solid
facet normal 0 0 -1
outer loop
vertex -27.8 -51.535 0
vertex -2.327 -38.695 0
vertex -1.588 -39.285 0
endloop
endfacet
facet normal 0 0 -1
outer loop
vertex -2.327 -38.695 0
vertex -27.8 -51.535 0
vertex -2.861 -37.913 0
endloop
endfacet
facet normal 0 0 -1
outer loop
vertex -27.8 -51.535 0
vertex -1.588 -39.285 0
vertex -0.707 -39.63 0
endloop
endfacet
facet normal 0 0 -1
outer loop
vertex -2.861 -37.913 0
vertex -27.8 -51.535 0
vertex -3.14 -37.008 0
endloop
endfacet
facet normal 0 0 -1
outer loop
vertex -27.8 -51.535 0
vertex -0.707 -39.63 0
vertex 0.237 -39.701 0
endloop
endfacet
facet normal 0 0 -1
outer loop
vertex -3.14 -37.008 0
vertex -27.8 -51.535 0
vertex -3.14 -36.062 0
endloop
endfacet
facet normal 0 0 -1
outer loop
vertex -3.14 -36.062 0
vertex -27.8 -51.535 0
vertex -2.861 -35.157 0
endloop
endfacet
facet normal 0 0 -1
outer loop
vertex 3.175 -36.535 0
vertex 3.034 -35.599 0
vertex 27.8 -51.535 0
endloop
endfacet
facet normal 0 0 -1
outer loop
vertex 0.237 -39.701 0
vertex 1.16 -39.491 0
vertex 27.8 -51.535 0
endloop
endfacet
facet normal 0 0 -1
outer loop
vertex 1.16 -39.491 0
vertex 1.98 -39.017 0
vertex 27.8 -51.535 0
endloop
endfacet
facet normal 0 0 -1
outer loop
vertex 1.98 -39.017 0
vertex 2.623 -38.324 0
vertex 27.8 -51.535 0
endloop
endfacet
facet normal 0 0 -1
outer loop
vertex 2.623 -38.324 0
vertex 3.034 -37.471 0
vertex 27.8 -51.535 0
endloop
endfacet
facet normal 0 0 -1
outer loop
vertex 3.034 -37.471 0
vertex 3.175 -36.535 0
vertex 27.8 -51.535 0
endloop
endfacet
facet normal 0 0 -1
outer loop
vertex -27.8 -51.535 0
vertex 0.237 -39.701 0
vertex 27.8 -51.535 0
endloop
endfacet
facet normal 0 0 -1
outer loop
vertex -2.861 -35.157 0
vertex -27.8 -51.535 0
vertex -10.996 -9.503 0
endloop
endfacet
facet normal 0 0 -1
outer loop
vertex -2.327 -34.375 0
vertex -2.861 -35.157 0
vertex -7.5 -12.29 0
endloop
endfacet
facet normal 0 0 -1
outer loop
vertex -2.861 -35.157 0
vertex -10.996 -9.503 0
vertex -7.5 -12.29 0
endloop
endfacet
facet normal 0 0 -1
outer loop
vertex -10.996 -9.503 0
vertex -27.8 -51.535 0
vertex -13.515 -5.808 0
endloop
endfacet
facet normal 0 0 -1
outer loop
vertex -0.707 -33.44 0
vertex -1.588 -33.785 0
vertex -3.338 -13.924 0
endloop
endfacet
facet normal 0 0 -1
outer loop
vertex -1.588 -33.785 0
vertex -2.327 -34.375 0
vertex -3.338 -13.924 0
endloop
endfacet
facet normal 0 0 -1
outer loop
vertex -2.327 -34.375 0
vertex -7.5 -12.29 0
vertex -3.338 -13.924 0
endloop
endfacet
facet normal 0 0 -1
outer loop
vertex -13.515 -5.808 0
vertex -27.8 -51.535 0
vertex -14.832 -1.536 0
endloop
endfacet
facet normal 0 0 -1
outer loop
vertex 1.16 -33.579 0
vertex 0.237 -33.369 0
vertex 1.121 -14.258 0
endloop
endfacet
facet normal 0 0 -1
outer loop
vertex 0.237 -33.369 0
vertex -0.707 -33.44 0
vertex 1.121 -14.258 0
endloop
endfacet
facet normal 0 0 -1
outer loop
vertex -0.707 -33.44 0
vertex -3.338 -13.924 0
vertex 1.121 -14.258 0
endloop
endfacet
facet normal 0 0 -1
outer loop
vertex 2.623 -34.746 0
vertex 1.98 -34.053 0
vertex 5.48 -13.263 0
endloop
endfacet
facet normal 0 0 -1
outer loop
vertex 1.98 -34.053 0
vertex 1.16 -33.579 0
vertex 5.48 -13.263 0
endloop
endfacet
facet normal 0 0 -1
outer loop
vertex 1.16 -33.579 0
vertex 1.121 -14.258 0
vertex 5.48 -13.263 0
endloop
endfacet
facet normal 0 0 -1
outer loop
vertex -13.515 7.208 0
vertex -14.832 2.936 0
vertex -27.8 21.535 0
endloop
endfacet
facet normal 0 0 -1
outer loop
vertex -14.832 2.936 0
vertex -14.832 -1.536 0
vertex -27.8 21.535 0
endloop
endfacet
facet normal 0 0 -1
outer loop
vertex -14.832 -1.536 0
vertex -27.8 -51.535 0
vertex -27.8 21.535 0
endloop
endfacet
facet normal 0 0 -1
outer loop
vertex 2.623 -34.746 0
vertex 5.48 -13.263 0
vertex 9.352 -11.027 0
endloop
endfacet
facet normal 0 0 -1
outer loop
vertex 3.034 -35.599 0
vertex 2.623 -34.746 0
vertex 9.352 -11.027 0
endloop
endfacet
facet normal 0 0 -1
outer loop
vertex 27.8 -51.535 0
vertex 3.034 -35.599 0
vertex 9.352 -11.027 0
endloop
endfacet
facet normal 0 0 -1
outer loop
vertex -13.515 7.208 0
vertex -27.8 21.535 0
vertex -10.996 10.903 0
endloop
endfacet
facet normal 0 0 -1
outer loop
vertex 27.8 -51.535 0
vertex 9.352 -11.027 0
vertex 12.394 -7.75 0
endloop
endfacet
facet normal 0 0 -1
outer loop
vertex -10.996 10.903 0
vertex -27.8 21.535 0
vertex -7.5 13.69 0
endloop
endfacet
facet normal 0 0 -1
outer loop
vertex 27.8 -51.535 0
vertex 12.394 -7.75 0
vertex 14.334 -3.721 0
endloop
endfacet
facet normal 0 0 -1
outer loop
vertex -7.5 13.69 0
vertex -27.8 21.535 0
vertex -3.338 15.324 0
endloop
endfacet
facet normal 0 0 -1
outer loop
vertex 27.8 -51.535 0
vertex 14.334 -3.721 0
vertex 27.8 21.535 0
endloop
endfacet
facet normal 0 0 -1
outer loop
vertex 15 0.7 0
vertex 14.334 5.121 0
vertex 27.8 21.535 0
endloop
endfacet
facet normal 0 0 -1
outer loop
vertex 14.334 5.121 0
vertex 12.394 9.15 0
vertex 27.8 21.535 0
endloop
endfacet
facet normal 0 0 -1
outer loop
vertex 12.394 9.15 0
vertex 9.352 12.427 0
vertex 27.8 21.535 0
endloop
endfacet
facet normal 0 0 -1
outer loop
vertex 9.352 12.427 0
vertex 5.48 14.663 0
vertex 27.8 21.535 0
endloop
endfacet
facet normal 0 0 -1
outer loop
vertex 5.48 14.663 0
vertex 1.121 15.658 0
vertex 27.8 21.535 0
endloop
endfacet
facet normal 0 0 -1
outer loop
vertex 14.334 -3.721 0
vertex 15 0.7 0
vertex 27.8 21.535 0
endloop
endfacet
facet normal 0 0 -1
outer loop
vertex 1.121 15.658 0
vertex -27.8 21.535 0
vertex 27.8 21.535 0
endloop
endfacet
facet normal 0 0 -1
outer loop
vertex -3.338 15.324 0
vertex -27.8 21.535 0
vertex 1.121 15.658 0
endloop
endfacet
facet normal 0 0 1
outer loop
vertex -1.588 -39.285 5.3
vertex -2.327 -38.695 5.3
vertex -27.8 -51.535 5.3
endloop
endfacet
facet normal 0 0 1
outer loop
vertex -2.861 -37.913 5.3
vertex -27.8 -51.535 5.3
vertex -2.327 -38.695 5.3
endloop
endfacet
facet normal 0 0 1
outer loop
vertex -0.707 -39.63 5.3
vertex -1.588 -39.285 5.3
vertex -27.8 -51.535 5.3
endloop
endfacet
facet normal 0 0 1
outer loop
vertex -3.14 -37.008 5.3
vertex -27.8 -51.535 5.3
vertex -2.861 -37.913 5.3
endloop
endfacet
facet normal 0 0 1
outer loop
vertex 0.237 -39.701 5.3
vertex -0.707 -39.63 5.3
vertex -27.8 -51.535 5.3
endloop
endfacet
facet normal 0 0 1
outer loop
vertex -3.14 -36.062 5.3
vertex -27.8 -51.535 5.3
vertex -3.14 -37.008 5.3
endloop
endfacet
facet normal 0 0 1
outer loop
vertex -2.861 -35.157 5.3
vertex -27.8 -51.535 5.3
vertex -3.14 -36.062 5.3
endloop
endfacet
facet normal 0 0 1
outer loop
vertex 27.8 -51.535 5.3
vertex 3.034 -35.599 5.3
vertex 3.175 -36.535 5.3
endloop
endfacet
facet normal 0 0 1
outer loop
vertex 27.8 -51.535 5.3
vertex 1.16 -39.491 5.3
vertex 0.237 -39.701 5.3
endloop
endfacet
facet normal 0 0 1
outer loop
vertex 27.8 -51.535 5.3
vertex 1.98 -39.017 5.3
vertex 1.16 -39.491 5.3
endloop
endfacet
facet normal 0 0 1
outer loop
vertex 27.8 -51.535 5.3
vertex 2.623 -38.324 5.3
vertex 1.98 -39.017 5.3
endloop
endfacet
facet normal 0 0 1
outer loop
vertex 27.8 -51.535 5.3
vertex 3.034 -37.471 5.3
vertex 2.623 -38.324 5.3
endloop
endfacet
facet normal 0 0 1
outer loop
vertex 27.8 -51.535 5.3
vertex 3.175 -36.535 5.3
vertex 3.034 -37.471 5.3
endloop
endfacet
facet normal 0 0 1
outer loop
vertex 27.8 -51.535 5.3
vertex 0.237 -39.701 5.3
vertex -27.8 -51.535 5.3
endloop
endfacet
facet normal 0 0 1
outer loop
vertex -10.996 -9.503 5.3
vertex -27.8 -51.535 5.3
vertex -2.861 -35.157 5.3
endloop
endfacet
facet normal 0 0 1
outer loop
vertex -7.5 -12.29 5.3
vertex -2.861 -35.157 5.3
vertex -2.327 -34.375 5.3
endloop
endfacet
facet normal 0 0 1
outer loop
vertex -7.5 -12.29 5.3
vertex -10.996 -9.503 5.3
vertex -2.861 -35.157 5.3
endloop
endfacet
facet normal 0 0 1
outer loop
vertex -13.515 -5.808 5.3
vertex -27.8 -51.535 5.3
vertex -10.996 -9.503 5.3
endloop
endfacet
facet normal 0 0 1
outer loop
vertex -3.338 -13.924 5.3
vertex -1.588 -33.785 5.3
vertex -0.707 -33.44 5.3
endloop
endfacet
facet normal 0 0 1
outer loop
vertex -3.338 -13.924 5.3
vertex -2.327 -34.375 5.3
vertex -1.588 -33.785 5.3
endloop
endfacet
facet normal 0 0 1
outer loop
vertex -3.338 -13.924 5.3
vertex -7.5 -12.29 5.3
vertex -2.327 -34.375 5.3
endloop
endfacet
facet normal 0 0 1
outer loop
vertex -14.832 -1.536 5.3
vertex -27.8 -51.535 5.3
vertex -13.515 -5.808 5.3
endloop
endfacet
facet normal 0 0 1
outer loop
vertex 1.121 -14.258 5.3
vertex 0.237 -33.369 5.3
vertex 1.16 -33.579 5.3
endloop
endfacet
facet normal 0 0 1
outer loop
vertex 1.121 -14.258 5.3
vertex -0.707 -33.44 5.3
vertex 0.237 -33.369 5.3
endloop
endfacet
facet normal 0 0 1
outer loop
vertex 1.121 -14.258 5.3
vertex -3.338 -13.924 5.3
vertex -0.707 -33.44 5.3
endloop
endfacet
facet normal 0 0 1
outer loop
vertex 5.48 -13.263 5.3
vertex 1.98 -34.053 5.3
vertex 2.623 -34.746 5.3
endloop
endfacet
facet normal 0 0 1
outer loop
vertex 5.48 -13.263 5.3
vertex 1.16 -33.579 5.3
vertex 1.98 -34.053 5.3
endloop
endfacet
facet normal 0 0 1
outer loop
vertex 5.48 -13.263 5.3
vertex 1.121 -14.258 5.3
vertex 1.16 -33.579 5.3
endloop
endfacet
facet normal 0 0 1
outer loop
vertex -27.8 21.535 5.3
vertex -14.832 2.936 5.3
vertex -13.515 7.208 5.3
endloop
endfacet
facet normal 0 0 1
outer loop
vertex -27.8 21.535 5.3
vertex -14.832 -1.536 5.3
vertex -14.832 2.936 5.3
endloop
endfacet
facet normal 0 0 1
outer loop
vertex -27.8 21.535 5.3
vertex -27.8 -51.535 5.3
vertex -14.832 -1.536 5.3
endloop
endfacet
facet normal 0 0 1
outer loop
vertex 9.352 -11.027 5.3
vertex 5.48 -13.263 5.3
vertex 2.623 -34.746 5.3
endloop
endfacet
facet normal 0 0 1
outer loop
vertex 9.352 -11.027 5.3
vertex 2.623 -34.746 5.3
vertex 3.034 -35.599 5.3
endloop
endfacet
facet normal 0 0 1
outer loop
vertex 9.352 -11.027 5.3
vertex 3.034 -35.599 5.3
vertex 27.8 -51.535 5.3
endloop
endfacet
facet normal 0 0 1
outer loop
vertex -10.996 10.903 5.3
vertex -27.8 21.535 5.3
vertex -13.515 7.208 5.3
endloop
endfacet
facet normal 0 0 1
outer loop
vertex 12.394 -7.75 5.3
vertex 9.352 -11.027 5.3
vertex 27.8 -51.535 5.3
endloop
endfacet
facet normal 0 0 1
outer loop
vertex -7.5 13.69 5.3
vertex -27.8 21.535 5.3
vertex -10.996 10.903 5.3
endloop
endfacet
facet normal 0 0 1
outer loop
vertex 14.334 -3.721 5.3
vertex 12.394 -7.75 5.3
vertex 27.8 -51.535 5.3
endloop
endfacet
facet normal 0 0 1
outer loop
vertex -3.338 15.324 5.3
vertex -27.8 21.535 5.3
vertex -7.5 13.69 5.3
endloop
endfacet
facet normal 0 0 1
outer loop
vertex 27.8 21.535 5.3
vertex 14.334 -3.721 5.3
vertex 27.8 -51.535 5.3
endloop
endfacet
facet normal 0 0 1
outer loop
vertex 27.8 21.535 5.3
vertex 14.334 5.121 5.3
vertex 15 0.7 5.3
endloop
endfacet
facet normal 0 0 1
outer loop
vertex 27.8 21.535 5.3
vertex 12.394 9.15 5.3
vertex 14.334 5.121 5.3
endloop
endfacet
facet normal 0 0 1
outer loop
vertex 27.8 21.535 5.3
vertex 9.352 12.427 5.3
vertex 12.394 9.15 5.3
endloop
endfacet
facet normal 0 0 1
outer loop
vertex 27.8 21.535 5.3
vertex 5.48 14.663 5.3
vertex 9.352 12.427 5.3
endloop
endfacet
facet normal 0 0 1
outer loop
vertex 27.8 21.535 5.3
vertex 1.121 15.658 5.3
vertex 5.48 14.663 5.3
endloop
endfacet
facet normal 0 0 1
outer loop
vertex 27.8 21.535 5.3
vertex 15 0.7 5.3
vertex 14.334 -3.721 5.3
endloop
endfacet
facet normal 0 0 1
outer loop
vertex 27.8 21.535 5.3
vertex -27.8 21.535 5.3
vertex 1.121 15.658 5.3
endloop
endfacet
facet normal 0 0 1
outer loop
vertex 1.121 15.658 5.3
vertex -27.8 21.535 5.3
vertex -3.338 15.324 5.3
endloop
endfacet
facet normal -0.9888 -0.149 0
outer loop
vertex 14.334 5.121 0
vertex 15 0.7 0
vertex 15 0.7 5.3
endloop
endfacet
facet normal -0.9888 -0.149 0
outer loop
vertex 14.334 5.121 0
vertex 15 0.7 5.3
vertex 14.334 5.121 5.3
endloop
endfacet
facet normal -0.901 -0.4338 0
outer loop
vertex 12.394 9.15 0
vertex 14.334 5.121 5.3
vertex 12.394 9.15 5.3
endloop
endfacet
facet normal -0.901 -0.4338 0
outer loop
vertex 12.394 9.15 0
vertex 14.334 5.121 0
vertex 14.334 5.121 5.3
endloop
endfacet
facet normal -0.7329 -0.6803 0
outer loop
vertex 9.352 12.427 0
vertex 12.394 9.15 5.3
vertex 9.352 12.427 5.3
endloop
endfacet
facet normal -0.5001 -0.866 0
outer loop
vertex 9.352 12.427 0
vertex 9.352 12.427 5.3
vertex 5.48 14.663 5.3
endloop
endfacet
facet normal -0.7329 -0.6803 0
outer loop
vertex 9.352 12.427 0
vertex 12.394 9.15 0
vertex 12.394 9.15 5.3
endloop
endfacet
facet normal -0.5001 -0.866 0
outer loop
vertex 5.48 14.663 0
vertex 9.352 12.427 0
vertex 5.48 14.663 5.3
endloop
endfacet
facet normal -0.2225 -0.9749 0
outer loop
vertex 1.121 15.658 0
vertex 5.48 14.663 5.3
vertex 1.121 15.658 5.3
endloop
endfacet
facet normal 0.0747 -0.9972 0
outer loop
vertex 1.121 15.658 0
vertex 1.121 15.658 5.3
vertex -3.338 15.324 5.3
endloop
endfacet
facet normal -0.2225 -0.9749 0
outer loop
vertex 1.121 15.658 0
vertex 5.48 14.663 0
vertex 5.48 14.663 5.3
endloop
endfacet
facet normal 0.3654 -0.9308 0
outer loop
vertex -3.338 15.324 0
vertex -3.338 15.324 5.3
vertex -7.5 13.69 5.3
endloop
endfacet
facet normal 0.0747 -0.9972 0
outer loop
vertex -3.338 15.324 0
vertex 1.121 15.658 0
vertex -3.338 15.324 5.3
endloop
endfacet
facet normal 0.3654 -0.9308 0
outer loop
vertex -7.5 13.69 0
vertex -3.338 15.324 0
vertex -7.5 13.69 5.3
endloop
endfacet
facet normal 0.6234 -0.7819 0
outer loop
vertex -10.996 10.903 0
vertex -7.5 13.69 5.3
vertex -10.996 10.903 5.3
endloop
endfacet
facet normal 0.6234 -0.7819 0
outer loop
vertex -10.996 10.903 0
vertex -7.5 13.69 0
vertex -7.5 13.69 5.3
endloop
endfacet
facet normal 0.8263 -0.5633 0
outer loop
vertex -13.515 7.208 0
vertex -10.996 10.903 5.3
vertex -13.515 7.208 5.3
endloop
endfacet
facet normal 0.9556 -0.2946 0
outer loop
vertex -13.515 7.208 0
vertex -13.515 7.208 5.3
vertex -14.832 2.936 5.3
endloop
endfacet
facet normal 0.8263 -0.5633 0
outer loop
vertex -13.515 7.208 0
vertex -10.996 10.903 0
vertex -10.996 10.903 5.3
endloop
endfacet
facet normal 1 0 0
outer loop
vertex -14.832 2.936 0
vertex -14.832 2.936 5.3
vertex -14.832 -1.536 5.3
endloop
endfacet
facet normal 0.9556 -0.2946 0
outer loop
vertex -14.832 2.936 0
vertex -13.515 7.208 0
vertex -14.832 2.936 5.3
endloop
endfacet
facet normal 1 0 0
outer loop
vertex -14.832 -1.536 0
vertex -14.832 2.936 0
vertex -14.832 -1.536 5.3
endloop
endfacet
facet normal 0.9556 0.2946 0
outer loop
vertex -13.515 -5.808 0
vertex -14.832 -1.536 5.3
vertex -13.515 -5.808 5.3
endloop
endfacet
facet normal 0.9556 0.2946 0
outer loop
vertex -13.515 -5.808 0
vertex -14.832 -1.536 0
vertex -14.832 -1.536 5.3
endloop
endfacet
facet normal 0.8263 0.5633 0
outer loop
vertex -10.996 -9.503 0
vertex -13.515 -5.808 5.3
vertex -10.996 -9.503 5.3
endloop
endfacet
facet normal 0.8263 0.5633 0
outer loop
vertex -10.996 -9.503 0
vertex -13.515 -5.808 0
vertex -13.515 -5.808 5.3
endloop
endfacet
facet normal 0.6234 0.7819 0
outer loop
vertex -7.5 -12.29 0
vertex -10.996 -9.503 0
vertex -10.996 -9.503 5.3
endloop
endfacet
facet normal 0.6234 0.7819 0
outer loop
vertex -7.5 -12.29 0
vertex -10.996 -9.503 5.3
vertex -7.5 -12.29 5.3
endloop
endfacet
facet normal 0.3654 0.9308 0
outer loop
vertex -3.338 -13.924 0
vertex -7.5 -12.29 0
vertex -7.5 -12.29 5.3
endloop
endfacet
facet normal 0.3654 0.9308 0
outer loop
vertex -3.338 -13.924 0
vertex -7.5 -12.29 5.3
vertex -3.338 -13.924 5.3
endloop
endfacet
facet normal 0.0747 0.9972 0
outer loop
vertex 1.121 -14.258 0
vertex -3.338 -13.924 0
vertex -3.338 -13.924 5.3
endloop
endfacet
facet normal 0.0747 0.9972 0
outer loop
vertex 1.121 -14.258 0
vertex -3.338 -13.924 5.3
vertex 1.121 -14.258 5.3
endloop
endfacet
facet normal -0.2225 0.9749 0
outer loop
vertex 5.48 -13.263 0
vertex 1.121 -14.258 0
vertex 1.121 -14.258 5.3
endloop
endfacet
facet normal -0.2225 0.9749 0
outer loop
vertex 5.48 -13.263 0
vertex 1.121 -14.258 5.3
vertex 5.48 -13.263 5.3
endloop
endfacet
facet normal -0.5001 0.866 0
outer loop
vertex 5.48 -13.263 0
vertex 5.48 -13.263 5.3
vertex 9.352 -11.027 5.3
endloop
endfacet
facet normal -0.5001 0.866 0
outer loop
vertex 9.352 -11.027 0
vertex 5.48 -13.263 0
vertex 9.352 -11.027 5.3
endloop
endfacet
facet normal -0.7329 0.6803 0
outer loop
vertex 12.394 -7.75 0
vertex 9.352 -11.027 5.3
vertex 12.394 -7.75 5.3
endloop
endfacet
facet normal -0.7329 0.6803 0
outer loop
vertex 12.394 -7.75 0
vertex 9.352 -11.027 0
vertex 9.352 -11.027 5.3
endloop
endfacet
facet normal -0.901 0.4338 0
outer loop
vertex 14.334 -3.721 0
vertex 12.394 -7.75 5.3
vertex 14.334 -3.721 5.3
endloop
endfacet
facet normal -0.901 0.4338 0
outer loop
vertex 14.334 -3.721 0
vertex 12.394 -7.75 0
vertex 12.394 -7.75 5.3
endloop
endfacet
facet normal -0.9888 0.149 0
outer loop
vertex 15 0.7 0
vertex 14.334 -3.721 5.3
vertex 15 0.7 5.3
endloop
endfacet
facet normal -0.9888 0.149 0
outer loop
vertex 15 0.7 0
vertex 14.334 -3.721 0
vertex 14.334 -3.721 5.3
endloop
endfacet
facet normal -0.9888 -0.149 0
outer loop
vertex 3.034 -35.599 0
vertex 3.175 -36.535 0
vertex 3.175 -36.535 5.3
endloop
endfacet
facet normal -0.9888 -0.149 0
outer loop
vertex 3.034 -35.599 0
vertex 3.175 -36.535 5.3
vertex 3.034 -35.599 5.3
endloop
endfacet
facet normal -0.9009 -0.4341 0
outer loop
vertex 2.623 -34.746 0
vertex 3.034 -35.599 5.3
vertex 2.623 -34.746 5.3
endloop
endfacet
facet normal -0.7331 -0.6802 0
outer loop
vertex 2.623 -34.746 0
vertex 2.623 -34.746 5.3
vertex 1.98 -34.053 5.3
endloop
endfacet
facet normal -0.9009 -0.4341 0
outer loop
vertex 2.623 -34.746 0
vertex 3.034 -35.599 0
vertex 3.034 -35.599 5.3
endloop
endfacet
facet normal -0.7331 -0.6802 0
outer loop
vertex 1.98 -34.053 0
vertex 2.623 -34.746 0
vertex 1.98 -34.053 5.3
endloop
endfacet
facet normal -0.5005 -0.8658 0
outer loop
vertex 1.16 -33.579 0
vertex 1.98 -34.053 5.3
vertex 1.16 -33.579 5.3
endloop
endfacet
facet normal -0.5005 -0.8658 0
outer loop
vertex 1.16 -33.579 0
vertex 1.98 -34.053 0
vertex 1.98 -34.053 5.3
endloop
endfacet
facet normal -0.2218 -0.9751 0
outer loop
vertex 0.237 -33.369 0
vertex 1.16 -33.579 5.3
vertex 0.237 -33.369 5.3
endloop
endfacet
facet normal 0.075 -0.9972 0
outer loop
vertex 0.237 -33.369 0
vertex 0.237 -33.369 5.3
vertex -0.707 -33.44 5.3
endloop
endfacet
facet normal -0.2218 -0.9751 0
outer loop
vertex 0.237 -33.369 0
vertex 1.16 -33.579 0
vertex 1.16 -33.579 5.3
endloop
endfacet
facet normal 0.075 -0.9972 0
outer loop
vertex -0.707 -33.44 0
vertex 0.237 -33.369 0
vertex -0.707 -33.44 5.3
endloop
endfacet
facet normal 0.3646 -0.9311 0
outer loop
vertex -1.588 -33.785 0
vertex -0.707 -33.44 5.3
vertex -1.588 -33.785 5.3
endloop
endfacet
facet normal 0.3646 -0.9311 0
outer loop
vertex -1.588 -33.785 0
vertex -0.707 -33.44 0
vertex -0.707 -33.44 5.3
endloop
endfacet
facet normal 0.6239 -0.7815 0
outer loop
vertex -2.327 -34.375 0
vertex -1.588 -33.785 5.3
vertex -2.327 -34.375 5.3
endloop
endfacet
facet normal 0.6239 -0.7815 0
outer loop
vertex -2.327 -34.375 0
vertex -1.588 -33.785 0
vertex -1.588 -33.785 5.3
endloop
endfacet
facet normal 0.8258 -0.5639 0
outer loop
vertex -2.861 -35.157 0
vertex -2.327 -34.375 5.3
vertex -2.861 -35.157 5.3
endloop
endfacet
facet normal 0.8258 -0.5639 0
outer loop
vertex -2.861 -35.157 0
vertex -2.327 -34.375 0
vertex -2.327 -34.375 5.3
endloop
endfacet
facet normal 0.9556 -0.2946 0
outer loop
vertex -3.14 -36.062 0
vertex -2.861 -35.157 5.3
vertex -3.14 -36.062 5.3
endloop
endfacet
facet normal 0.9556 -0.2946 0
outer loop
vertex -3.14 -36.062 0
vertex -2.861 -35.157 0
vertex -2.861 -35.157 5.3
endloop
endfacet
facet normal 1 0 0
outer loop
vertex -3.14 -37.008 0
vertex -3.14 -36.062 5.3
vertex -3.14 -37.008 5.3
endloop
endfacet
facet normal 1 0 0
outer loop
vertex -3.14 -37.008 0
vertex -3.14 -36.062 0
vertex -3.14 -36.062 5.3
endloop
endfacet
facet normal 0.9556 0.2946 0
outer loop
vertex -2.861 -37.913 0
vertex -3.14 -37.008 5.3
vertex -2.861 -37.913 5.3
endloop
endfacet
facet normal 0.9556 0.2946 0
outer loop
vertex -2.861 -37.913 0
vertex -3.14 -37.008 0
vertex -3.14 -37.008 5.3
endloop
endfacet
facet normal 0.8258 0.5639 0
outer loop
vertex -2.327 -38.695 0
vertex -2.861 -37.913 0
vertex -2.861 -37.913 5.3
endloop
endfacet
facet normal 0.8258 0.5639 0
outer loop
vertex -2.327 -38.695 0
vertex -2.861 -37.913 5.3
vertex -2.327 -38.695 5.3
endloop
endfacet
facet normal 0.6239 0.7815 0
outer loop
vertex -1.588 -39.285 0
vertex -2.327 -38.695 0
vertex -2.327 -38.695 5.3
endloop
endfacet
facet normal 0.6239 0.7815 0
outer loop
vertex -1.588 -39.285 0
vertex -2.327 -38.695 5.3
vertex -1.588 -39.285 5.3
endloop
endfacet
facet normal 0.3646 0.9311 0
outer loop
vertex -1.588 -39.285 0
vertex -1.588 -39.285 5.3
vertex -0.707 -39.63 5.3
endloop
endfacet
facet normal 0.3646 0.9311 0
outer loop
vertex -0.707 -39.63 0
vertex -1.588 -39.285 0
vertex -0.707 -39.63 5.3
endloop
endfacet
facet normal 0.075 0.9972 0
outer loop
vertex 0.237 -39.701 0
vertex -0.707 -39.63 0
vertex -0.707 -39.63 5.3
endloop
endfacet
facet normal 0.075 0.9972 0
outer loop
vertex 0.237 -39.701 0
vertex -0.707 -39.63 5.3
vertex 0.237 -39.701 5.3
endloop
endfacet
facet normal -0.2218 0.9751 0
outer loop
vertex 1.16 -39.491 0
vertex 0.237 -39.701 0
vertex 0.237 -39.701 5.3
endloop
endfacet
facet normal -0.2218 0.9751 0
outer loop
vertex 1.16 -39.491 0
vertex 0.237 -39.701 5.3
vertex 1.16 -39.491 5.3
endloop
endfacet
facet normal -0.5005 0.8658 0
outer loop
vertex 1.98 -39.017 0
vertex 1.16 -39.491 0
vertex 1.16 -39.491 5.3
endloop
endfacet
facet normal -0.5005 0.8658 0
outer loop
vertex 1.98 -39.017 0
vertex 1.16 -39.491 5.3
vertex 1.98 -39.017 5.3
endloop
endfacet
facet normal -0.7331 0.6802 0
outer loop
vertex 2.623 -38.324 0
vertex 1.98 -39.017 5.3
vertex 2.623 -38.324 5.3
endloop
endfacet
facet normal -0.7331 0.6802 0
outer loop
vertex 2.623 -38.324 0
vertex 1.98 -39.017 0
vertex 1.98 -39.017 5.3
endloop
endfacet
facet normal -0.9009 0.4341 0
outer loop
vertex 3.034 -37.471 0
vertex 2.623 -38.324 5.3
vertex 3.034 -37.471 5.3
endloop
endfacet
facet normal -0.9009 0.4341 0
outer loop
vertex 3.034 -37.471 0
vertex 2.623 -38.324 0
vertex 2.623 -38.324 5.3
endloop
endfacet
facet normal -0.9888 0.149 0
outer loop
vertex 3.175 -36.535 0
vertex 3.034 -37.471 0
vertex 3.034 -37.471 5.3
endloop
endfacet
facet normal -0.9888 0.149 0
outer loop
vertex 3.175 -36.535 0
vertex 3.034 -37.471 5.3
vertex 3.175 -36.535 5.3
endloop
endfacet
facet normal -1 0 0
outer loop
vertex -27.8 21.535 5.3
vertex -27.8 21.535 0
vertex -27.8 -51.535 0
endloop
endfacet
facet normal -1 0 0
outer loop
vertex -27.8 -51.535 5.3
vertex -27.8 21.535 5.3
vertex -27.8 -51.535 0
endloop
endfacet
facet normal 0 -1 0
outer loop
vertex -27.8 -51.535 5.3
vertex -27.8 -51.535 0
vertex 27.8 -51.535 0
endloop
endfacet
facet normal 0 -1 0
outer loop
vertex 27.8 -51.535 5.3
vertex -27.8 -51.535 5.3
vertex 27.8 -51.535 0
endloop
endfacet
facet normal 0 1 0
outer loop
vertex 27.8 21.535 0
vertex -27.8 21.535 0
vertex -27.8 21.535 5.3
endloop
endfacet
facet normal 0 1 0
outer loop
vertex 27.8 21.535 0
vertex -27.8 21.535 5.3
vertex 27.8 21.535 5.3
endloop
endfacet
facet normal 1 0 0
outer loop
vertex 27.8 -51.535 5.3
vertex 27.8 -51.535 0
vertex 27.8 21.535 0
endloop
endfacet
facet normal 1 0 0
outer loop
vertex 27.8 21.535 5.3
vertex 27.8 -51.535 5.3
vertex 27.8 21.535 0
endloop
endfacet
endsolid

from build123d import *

# Parameters (mm, degrees)
F0_W     = 55.6
F0_H     = 43.07
F0_R     = 15
F0_H_2   = 30
F0_R_2   = 3.175
F1_DEPTH = 5.3


with BuildPart() as f1:
    # F0 (on Top) → F1 (new body)
    with BuildSketch(Plane.XY):
        Rectangle(F0_W, F0_H)
        with Locations((0, 0.7)):
            Circle(F0_R, mode=Mode.SUBTRACT)
        with Locations((0, -36.535)):
            Rectangle(F0_W, F0_H_2)
        with Locations((0, -36.535)):
            Circle(F0_R_2, mode=Mode.SUBTRACT)
    extrude(amount=F1_DEPTH)


solid = f1.part
